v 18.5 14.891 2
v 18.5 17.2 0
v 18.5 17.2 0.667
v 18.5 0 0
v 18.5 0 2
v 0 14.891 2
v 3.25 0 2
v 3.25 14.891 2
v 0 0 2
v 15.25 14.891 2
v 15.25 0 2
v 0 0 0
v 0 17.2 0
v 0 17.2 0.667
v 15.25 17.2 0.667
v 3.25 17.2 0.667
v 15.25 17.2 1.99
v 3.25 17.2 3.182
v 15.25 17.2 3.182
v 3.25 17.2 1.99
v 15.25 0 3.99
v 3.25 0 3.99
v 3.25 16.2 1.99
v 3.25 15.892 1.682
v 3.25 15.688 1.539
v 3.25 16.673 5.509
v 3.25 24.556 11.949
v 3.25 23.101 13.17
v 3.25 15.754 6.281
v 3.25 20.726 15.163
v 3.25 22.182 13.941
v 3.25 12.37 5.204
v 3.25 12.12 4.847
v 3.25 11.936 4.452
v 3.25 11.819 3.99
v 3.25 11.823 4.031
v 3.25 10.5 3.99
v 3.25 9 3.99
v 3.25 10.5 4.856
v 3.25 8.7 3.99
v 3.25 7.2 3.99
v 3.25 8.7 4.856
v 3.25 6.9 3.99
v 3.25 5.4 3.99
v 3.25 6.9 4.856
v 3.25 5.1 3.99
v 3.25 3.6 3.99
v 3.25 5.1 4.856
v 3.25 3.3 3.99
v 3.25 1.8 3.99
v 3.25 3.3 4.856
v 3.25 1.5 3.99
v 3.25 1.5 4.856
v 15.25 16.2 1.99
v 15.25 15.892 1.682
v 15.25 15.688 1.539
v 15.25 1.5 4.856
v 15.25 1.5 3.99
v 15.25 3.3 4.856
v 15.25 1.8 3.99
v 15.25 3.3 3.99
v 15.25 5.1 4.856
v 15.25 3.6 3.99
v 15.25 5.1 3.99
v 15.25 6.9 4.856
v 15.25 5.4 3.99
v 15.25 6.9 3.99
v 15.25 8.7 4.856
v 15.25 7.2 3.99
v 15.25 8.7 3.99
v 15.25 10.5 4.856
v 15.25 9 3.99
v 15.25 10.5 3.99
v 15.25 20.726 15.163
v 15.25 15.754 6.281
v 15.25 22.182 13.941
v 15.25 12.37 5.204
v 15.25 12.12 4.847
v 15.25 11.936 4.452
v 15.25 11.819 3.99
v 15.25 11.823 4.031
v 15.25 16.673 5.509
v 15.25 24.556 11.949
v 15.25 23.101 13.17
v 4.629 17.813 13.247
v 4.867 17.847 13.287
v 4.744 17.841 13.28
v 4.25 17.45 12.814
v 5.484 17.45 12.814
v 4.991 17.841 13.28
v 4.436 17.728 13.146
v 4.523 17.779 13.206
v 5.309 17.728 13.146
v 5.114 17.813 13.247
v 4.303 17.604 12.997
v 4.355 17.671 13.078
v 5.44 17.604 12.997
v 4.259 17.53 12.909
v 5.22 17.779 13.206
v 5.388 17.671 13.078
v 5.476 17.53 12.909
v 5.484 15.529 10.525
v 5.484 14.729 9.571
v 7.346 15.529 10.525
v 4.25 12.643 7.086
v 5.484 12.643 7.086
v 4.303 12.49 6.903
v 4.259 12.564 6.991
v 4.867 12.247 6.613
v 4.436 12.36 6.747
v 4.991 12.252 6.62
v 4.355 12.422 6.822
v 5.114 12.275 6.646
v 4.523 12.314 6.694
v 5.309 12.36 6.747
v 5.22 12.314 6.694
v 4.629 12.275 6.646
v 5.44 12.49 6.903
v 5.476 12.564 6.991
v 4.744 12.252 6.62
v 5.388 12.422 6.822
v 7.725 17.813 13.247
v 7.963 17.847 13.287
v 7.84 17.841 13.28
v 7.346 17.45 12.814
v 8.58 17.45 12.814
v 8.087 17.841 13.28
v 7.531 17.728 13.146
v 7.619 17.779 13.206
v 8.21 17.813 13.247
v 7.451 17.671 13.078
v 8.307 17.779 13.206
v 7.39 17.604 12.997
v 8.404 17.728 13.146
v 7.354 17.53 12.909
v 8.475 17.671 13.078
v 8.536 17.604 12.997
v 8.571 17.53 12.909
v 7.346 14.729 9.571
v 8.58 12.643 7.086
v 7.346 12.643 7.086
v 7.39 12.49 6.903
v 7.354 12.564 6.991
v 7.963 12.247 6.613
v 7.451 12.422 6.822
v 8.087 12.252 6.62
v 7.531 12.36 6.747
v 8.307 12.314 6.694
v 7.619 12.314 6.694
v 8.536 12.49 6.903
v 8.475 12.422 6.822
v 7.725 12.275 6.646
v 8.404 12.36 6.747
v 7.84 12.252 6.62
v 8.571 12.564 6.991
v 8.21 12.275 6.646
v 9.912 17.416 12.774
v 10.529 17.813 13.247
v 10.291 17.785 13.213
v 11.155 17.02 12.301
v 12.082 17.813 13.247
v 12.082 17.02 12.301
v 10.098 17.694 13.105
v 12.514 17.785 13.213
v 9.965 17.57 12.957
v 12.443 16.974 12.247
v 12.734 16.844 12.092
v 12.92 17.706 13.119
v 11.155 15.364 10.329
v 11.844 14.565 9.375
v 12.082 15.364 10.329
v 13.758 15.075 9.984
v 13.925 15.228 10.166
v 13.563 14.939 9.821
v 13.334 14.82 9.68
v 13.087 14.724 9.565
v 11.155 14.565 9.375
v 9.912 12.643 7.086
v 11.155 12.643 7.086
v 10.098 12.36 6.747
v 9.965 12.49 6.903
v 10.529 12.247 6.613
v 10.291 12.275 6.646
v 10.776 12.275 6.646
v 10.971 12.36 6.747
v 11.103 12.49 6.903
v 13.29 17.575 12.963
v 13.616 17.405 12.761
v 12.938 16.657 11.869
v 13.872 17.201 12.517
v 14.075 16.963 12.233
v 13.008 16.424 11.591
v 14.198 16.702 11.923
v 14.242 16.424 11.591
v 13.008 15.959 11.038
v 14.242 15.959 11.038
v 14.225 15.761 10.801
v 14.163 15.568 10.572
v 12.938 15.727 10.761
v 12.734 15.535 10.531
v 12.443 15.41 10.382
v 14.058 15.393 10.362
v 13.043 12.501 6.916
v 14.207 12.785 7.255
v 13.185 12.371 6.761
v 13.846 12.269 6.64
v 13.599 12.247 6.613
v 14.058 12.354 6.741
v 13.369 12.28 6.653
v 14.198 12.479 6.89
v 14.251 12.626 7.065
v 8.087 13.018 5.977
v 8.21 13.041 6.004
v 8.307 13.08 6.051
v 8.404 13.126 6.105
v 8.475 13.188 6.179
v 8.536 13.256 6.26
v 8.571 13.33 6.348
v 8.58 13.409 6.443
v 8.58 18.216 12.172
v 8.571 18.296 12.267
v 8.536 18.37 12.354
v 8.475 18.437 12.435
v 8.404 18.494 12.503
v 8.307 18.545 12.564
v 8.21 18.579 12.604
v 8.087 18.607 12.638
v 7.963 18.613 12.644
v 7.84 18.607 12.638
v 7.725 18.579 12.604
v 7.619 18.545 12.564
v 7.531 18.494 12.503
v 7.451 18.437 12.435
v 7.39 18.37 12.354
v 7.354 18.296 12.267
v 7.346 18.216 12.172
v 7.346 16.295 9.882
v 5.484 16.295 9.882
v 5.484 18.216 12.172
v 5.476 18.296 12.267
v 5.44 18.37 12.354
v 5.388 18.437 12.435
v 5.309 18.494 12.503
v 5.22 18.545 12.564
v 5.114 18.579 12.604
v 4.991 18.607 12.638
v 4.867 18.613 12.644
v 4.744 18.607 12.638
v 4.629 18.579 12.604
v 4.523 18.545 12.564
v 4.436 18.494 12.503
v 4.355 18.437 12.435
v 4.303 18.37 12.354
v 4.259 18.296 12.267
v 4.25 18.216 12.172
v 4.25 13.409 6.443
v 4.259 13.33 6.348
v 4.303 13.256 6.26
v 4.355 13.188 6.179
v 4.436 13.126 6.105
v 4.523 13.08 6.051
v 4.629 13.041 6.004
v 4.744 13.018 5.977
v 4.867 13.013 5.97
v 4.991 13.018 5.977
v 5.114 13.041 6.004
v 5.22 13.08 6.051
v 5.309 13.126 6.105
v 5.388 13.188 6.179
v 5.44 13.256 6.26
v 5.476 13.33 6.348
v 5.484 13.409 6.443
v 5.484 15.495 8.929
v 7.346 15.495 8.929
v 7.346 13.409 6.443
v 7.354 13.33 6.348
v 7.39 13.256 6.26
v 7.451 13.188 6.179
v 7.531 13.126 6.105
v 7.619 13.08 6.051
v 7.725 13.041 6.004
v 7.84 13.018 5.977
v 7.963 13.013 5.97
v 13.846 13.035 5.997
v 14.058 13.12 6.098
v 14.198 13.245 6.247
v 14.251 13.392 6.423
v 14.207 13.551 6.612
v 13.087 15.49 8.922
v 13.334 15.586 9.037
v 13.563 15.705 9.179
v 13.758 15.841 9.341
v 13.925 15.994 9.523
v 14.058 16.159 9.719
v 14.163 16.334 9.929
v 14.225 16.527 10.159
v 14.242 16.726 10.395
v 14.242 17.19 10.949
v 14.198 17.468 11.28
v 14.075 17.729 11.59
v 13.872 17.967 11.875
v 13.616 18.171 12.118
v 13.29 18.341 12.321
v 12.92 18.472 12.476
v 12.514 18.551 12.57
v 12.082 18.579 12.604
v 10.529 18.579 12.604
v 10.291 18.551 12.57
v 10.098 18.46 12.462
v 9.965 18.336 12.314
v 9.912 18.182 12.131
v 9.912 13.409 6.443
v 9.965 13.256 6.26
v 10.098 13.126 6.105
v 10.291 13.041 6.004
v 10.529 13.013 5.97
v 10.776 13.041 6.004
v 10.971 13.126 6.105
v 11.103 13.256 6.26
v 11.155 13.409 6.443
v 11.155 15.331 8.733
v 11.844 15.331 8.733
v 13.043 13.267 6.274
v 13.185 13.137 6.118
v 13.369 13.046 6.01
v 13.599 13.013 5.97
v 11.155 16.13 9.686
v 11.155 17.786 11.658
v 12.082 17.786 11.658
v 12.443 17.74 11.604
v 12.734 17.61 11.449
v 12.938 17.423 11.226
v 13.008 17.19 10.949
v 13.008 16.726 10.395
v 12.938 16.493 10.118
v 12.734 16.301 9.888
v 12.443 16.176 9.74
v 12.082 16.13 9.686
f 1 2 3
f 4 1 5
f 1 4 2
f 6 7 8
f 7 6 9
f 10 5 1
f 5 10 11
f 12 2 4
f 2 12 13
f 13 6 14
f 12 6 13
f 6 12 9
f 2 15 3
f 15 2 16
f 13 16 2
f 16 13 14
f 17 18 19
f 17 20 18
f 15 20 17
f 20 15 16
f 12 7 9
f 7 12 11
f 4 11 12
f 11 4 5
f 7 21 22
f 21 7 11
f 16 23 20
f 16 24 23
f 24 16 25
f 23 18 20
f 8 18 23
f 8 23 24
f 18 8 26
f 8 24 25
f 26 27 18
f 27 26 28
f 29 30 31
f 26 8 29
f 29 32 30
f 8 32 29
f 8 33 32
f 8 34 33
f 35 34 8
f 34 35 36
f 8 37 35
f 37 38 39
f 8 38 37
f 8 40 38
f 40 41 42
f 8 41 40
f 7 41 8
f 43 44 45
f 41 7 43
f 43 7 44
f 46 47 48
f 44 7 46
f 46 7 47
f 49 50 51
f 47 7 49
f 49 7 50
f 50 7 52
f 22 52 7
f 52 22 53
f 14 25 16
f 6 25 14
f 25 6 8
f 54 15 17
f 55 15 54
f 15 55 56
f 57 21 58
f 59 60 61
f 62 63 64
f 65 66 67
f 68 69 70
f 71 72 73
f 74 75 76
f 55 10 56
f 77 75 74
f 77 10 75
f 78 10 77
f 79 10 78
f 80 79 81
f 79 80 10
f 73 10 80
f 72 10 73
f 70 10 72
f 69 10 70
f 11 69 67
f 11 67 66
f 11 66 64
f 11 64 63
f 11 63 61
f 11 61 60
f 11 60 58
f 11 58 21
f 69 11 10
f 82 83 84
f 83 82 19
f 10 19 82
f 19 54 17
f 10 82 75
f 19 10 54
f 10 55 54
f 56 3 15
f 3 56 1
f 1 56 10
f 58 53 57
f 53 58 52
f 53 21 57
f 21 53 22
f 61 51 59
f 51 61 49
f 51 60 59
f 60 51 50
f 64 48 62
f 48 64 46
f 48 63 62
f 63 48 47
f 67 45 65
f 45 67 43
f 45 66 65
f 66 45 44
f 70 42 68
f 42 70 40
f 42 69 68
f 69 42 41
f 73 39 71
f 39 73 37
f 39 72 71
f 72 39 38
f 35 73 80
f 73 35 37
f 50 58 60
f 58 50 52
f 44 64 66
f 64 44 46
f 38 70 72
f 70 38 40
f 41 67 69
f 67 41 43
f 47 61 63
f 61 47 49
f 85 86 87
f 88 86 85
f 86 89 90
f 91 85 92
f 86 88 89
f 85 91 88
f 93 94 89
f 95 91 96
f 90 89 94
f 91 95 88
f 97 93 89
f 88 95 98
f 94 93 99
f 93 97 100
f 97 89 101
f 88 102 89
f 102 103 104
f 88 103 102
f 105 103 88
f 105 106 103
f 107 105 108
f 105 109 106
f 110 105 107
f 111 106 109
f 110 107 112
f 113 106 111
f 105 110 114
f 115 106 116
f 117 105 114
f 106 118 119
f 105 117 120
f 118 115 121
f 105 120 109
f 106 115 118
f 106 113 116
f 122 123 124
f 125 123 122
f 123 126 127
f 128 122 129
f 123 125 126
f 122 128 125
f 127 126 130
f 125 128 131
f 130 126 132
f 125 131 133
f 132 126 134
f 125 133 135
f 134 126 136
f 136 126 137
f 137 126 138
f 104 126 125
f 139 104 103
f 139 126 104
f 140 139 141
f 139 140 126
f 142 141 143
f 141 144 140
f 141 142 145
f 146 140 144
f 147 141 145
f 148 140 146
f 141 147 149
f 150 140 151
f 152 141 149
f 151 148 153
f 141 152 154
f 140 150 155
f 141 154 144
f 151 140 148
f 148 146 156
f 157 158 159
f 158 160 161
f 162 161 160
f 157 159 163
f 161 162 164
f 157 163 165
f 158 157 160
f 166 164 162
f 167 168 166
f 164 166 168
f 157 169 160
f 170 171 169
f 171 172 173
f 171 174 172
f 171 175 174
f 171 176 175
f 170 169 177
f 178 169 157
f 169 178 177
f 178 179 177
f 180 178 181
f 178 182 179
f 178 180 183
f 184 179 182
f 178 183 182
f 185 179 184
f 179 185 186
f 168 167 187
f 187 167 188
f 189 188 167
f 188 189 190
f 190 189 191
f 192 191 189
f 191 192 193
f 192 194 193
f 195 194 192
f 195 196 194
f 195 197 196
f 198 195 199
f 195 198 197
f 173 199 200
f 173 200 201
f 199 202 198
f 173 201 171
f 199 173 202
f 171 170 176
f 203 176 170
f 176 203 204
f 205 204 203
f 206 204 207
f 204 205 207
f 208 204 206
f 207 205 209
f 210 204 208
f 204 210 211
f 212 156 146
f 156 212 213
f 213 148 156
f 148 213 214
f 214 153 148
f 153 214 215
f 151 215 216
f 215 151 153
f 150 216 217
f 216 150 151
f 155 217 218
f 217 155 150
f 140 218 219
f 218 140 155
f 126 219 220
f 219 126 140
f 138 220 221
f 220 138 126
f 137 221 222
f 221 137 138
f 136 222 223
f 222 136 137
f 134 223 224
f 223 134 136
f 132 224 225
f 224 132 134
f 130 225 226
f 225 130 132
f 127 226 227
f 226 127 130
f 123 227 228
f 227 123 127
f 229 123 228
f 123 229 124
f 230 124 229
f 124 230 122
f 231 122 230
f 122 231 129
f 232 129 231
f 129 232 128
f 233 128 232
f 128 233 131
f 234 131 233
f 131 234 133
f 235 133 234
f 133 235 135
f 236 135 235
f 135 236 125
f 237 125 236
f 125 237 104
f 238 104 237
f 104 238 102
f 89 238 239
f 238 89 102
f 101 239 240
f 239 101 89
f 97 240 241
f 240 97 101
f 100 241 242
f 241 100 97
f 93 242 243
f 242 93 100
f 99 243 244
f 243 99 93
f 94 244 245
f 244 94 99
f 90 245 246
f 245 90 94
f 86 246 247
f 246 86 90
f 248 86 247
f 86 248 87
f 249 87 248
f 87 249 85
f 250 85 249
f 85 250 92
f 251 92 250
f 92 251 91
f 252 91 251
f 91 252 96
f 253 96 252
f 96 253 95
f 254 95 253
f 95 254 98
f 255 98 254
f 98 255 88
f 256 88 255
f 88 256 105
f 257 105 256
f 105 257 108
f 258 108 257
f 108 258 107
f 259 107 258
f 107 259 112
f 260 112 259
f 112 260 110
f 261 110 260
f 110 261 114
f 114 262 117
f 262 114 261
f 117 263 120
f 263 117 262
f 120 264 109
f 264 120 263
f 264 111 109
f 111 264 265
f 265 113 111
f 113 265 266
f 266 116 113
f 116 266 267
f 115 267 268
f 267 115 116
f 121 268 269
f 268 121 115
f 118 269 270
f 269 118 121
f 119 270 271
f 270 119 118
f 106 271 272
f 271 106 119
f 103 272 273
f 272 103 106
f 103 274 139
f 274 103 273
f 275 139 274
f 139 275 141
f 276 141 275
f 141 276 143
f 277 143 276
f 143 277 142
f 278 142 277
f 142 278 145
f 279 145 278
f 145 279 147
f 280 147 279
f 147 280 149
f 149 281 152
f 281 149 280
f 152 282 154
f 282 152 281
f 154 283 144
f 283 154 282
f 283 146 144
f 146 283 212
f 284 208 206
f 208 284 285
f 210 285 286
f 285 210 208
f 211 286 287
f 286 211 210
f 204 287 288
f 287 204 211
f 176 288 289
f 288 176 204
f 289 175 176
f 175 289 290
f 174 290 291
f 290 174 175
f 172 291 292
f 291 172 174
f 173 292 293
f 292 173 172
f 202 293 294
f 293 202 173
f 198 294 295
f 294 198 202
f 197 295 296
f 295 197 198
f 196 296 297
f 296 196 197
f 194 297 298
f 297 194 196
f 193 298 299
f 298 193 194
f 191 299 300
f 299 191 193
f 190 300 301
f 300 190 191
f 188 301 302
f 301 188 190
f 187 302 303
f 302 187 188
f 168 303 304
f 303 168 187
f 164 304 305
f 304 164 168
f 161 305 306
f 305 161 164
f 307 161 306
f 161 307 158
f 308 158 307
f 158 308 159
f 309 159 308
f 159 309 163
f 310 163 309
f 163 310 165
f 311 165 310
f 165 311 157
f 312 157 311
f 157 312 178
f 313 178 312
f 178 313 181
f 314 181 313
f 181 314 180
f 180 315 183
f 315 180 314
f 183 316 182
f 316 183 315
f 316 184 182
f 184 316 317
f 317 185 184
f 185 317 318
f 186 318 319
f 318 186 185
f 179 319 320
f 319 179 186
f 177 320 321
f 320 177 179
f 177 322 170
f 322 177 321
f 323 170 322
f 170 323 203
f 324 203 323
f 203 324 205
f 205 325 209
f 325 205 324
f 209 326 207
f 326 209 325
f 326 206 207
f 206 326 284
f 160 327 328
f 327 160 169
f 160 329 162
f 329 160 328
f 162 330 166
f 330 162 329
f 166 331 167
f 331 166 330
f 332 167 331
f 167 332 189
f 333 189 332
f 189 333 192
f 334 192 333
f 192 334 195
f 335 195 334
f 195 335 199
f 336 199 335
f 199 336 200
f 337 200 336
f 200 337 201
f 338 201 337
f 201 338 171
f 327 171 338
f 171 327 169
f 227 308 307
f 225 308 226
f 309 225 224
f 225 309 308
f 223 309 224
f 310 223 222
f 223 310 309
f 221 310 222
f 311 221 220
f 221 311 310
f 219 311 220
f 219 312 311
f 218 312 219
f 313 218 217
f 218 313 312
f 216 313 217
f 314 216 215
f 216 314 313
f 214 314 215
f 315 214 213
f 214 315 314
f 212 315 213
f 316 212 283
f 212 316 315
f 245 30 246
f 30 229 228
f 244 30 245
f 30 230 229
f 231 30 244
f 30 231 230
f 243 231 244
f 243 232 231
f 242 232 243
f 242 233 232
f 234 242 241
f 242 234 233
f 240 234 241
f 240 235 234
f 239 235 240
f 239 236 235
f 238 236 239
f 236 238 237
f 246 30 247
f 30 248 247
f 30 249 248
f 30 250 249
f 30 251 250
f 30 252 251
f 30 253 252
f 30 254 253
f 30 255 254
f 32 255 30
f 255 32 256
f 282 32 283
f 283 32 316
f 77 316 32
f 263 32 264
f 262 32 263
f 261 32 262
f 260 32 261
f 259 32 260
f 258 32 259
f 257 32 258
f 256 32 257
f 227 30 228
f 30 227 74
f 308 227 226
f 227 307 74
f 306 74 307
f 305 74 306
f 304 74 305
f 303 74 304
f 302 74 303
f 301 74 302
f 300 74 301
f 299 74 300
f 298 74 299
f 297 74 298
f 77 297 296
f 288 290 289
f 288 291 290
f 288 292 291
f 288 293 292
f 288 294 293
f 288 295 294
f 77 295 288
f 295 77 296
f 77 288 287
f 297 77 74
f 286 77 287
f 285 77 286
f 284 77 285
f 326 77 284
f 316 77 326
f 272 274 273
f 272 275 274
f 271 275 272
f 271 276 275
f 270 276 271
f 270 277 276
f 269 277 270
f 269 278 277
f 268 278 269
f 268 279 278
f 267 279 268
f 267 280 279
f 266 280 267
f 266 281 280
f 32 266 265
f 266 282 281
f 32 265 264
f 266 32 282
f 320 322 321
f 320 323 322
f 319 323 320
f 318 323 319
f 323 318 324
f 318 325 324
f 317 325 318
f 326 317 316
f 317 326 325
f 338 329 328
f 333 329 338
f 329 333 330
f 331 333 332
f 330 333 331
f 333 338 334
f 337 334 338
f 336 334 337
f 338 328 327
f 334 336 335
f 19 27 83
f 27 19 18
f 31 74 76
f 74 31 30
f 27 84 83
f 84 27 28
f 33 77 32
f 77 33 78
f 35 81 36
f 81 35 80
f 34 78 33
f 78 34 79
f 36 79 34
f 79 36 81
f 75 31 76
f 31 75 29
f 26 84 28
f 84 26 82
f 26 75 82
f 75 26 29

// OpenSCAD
hs_w      = 18.5;
hs_l      = 17.2;
hs_h      = 2;
hs2_w     = 12;
hs2_l     = hs_l;
hs2_h     = 2;
hs2_x_off = (hs_w-hs2_w)/2;
hs3_l     = 13;
hs3_h     = 5;
hs3_w     = 1.2;

module hotshoe() {
    union() {
        difference() {
            cube([hs_w, hs_l, hs_h]);
            translate([-1,hs_l,hs_h/3]) rotate([60,0,0]) cube([hs2_x_off+1, 10,10]);
            translate([hs2_x_off+hs2_w,hs_l,hs_h/3]) rotate([60,0,0]) cube([hs2_x_off+1, 10,10]);
        }
        translate([hs2_x_off, 0, hs_h-0.01]) {
            cube([hs2_w, hs2_l, hs2_h]);
            for ( i = [0:5]) 
                translate([0,1+i*1.8,hs2_h]) rotate([0,90,0]) rotate([0,0,30]) cylinder(h=hs2_w, $fn=3);
        }
        translate([hs2_x_off, hs2_l-1, hs_h-0.01])
        rotate([50,0,0])
        difference() {
            union() {
                translate([1,1,hs3_h-1]) linear_extrude(height=1+1) import(file="HR.dxf", layer="initials");
                cube([hs2_w, hs3_l, hs3_h]);
                translate([0,0,hs3_h/2]) rotate([0,90,0]) cylinder(h=hs2_w, r=hs3_h/2, $fn=36);
            }
            translate([-1,3,(hs3_h-hs3_w)/2]) cube([hs2_w+2, hs3_l, hs3_w]);
        }
    }
}

hotshoe();
